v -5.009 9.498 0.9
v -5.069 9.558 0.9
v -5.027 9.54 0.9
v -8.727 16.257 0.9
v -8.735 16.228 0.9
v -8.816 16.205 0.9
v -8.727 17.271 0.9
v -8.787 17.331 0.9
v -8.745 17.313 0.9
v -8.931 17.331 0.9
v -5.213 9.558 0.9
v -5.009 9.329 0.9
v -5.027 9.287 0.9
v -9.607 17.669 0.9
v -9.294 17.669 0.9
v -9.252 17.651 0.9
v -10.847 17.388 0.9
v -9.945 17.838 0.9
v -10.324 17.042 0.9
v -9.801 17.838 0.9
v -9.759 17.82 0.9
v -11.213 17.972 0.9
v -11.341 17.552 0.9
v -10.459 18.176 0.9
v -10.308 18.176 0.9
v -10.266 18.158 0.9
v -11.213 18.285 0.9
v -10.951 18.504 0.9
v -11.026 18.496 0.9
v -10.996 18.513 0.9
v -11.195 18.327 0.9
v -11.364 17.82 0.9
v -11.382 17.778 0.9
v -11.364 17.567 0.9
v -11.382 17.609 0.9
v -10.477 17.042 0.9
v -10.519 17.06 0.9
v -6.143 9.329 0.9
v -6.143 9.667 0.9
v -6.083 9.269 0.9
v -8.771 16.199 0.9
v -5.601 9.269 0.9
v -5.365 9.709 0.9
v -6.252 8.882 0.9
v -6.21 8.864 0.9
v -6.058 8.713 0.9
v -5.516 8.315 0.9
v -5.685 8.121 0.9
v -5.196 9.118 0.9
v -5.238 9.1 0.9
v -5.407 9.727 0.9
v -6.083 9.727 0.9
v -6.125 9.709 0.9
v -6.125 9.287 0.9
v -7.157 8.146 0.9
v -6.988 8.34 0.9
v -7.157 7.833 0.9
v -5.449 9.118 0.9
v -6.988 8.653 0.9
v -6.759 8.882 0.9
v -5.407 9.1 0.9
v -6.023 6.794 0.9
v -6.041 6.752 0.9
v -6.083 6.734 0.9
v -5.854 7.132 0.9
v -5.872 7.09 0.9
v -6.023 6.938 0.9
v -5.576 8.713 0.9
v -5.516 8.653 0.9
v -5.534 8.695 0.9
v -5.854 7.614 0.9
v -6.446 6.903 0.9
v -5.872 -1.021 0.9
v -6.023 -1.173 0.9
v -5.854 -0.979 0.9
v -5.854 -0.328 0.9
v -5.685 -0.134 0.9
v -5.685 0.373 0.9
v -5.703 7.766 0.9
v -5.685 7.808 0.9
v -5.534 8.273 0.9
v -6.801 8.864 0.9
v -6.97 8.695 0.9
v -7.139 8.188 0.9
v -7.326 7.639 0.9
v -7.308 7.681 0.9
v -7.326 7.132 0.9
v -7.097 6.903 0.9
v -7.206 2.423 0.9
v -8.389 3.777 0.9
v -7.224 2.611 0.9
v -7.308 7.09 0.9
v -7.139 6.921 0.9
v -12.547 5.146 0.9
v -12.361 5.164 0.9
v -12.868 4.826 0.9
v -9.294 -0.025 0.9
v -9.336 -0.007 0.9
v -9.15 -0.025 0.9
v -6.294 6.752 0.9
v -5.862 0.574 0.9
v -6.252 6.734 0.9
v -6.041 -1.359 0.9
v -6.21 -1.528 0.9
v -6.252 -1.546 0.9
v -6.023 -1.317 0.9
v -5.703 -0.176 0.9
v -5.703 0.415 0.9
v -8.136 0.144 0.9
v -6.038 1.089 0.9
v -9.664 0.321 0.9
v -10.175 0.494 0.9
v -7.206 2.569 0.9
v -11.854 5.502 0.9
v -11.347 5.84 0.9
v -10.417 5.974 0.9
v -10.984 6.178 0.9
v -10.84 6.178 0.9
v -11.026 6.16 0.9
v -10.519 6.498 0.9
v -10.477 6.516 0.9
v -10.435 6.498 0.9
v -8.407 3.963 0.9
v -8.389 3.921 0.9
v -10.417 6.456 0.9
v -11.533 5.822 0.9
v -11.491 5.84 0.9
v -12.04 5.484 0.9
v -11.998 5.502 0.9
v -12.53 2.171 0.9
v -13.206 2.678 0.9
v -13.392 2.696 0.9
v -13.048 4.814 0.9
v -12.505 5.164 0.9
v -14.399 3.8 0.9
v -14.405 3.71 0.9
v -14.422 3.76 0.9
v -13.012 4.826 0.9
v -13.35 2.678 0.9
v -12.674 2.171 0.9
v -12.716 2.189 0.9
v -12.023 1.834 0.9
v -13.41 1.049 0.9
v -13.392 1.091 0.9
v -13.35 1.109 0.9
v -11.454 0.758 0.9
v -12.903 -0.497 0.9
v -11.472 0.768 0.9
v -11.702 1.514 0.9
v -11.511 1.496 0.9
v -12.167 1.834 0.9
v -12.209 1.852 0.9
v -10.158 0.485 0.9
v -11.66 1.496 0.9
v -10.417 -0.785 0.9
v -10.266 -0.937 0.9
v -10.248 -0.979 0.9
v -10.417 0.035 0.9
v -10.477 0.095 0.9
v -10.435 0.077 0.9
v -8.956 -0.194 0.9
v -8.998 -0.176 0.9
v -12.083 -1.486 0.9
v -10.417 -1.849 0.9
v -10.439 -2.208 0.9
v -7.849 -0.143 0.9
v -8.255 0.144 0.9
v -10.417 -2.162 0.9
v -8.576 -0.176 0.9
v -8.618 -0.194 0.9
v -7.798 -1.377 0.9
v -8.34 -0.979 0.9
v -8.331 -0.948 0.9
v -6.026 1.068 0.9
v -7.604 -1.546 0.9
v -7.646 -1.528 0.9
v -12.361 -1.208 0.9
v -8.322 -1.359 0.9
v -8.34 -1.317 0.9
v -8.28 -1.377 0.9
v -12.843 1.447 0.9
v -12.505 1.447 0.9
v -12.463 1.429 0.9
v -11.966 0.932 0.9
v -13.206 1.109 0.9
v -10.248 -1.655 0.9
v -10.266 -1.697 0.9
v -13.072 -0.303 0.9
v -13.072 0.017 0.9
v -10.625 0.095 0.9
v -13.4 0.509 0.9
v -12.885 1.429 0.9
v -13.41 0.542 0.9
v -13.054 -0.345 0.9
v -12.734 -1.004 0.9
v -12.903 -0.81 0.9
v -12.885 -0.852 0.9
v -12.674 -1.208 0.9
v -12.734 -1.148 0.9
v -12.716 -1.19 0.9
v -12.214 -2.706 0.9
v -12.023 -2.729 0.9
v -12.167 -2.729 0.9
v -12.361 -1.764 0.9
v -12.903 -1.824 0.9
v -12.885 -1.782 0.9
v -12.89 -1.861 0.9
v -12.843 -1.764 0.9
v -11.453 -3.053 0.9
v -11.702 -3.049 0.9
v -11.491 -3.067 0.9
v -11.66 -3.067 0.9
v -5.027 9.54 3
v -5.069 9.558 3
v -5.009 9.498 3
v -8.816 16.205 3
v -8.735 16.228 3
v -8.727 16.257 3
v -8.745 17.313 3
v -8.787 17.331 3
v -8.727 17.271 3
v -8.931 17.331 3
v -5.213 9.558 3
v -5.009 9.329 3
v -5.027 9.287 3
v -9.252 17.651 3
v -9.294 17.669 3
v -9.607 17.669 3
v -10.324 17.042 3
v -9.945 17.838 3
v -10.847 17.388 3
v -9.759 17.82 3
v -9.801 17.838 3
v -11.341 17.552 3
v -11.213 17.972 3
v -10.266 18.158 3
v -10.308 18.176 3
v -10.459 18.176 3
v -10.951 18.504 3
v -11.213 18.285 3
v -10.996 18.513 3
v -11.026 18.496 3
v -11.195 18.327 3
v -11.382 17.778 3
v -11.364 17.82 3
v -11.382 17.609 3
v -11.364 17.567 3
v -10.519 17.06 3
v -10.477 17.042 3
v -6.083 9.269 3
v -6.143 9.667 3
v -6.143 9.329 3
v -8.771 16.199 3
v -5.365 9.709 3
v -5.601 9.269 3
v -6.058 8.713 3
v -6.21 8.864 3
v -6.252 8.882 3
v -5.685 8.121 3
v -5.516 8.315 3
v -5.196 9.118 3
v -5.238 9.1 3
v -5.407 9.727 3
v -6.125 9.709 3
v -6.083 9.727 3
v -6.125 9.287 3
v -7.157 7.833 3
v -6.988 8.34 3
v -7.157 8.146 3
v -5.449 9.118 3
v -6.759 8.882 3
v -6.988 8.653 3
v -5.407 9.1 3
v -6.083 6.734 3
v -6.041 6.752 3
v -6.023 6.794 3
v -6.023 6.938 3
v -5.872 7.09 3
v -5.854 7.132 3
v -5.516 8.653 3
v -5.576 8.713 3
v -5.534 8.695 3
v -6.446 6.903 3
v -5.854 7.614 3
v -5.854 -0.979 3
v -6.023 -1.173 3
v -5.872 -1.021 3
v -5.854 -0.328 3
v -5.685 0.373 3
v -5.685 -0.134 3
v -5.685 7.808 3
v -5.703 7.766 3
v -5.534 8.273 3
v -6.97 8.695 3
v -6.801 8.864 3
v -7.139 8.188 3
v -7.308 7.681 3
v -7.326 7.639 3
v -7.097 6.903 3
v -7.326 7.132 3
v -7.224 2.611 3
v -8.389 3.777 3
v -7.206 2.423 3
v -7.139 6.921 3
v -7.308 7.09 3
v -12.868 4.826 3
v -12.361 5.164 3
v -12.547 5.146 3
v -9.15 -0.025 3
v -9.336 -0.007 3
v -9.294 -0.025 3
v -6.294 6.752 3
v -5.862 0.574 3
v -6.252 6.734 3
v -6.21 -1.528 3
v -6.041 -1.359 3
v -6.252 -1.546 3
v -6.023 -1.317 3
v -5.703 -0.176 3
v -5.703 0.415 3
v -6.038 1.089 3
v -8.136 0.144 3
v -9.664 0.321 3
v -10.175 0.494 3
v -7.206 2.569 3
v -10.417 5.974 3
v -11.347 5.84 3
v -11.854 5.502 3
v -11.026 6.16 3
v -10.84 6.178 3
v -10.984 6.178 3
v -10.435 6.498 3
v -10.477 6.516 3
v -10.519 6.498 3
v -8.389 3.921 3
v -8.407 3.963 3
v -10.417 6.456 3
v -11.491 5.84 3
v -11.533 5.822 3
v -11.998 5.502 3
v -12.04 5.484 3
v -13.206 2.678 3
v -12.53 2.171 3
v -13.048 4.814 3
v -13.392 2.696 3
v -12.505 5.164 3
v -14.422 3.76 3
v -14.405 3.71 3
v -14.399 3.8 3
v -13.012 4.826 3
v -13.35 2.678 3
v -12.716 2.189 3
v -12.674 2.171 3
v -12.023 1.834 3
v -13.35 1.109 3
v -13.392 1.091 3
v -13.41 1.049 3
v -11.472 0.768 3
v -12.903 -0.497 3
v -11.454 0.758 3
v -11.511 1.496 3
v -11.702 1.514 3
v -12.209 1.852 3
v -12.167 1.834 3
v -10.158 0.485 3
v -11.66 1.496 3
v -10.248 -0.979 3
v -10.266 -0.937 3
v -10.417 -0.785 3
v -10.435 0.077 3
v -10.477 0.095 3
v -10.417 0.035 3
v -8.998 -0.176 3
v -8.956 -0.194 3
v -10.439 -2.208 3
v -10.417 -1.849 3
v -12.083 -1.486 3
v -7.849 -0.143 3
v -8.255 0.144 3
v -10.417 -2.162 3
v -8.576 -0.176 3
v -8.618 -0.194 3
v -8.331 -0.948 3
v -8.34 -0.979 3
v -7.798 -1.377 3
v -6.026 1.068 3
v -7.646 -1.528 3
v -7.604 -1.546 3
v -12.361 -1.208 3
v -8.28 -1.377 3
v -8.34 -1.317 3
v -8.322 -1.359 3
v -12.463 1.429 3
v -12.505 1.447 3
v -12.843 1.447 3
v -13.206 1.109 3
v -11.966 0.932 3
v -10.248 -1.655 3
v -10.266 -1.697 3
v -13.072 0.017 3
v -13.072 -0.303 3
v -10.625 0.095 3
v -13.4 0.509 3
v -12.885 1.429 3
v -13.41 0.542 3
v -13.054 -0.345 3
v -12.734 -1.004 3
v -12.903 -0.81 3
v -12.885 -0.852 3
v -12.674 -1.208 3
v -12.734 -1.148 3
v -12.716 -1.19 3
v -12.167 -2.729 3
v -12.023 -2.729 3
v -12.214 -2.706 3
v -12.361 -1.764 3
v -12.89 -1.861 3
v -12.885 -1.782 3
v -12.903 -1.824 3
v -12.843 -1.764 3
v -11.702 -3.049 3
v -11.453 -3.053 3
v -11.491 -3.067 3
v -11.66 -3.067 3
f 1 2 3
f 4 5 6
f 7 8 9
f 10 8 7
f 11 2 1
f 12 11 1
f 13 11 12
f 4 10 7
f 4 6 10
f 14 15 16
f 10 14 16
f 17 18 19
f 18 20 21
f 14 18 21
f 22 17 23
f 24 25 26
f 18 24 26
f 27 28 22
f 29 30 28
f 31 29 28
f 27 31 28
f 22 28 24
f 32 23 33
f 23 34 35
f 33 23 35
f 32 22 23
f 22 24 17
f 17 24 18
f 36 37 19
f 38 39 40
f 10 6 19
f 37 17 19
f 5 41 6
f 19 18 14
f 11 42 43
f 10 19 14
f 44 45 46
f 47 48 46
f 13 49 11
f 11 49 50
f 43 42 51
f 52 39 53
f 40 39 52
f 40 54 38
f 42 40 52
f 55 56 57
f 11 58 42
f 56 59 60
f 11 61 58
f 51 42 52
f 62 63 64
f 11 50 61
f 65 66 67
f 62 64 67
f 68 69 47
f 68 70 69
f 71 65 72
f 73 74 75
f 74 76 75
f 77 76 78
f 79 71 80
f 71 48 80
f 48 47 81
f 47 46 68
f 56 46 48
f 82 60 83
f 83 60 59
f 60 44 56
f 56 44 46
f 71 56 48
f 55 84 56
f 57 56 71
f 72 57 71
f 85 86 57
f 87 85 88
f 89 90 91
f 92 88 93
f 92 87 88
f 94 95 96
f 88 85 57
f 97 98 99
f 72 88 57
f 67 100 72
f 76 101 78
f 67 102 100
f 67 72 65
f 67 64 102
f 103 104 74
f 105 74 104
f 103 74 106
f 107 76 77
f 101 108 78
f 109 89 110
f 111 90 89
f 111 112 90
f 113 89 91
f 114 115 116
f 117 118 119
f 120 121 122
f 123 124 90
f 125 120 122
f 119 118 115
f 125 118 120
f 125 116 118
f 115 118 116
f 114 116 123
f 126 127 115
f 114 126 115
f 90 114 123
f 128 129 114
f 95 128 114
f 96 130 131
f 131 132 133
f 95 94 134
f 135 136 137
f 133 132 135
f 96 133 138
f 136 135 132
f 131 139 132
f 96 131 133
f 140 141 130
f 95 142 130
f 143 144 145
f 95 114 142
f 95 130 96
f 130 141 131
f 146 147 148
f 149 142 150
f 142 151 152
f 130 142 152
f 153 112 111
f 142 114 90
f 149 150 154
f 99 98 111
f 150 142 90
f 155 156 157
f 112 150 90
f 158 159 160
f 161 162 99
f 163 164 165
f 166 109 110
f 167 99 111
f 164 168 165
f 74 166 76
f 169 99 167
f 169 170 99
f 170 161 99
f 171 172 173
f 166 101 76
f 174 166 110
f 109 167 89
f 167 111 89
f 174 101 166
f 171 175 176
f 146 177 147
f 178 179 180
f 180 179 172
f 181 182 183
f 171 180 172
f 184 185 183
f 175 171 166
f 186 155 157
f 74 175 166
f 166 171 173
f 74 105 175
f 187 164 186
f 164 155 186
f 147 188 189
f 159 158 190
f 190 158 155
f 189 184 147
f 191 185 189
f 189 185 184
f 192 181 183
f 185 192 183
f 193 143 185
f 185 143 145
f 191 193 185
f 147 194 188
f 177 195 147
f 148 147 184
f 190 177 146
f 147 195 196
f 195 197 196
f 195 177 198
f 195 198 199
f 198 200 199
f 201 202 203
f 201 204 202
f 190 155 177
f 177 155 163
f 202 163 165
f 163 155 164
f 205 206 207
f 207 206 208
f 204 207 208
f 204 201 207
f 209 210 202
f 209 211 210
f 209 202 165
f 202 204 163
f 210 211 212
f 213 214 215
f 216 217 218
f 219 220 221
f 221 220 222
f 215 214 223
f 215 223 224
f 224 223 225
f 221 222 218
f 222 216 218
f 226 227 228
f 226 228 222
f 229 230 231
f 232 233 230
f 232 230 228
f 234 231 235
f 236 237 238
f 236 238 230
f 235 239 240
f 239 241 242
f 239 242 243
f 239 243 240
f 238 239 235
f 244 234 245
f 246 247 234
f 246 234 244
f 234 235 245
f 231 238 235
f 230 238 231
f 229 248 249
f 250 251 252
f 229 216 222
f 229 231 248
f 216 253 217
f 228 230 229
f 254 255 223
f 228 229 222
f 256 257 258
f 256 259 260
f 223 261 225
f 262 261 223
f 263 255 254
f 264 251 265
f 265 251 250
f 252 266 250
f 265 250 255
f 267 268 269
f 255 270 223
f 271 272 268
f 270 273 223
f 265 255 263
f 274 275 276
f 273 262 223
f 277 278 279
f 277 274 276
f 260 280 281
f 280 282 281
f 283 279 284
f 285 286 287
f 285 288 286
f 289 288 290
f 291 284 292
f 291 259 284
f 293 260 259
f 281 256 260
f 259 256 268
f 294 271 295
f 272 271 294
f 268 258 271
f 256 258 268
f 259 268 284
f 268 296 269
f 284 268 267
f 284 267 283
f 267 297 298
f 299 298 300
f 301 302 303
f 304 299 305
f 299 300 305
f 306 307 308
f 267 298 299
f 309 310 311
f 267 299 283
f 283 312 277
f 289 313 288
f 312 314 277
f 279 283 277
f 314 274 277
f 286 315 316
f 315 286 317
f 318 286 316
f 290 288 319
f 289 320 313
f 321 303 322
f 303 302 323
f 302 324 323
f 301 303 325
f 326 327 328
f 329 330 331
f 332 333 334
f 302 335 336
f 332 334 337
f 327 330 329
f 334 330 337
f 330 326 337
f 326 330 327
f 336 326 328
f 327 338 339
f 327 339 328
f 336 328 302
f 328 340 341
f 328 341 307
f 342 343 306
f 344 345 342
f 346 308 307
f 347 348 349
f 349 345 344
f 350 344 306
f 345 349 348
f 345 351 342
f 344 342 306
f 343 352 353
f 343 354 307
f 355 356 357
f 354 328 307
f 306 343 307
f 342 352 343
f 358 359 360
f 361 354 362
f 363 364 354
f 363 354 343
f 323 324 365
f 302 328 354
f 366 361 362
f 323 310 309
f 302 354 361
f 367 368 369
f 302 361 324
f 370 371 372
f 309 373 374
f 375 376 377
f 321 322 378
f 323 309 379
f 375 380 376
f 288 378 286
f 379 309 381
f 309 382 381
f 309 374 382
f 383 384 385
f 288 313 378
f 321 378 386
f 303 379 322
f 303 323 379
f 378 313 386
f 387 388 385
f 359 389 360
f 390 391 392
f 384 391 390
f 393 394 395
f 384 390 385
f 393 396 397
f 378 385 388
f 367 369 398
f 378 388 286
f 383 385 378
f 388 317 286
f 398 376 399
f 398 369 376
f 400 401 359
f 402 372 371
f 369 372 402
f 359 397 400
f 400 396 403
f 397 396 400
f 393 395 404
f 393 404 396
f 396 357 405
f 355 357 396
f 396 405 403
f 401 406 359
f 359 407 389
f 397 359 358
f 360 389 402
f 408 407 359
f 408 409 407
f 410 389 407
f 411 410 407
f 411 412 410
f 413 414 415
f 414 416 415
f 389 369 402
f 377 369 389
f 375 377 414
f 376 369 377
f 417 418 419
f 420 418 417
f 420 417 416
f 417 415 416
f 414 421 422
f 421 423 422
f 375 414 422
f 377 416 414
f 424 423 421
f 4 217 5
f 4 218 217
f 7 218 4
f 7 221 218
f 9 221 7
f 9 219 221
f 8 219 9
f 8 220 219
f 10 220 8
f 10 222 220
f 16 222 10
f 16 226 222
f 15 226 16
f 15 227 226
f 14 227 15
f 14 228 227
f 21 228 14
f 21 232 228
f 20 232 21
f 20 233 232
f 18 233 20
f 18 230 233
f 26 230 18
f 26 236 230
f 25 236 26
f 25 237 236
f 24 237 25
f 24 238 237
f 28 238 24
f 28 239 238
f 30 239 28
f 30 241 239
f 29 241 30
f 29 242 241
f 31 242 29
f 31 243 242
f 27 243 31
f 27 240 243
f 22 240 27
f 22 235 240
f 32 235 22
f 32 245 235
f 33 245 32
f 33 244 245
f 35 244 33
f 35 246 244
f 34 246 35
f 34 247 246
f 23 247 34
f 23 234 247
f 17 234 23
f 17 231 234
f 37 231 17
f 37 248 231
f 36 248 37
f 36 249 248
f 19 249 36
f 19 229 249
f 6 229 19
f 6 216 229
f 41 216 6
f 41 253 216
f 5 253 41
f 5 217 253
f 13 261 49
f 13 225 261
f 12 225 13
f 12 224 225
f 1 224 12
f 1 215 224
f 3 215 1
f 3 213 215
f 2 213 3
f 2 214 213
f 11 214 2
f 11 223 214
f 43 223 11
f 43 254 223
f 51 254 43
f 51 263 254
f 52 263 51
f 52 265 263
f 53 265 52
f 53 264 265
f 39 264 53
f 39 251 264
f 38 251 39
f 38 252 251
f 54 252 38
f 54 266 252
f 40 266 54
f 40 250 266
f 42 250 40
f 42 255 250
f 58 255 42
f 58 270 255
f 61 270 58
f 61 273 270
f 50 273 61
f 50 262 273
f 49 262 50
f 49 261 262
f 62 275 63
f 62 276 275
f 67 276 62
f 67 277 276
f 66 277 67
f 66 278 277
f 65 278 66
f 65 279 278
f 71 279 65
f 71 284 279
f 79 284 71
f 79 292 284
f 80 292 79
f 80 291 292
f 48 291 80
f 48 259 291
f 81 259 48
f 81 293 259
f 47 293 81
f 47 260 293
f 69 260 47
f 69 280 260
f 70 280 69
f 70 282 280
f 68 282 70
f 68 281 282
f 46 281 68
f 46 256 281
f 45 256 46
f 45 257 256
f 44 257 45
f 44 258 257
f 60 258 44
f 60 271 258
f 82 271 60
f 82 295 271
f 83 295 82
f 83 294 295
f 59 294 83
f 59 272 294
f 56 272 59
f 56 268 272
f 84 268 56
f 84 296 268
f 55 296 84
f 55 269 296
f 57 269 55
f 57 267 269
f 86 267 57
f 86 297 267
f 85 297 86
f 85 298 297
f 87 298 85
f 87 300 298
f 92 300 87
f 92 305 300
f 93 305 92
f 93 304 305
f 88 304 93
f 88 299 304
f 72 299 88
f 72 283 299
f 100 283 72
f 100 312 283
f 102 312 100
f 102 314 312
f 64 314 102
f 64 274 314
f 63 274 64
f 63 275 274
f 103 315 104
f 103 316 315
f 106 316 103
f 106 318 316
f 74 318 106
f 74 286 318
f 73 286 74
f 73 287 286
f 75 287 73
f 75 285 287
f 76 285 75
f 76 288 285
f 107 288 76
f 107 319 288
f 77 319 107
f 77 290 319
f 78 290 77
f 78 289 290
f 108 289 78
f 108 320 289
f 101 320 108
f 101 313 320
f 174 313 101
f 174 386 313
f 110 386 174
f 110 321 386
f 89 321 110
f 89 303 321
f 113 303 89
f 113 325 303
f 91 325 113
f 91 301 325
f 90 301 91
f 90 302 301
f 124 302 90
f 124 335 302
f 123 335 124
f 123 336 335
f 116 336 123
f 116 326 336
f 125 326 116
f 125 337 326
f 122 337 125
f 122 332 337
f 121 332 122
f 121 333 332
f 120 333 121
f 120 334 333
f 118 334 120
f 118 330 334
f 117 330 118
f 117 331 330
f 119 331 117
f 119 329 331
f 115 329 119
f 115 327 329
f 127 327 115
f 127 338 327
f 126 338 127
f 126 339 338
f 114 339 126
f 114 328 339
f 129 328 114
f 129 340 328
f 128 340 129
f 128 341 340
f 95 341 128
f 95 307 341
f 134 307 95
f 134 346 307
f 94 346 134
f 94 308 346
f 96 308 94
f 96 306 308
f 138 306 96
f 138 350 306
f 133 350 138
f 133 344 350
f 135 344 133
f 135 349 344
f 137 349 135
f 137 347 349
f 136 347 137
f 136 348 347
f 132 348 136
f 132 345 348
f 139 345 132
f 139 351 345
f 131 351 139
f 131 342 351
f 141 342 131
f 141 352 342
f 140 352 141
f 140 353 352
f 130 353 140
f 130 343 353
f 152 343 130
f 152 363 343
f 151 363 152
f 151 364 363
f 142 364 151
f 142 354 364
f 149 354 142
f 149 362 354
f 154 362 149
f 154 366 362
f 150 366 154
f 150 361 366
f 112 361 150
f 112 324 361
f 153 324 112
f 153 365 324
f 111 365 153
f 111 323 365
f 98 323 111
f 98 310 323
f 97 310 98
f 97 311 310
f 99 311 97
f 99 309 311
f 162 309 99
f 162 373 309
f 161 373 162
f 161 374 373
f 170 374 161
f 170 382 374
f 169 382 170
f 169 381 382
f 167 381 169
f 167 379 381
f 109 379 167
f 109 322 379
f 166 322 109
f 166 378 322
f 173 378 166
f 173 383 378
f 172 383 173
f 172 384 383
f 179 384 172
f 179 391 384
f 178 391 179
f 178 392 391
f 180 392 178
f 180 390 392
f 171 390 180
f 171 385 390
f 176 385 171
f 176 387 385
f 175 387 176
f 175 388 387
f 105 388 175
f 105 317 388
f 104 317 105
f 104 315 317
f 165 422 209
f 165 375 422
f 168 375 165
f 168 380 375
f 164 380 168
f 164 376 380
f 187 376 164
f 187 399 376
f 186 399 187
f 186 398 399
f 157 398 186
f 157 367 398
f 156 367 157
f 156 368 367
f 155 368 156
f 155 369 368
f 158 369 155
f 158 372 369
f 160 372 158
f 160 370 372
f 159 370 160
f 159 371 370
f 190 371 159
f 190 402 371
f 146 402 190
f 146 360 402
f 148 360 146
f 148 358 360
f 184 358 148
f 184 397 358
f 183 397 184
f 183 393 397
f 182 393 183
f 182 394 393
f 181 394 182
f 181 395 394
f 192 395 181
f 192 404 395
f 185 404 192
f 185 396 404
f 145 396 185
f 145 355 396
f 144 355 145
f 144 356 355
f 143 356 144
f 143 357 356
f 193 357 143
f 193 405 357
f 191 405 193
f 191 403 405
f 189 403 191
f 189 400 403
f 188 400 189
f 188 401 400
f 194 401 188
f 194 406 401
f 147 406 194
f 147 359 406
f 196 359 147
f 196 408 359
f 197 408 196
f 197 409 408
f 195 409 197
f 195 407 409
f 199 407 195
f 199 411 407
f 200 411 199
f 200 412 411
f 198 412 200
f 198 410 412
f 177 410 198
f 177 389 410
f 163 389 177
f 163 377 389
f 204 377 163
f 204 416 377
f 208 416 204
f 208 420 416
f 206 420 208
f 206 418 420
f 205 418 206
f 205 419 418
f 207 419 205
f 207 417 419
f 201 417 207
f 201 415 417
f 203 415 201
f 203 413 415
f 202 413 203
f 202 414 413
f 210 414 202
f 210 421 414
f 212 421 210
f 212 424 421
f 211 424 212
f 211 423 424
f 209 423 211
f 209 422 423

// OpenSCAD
$fn = 24;
translate([0, -2.500, 0.900])
  linear_extrude(height=2.100) {
offset(r=0.06, $fn=8) {
    polygon(points=[[-12.843,3.887],[-13.181,3.549],[-13.350,3.549],[-13.350,3.042],[-13.012,2.535],[-13.012,2.197],[-12.843,2.028],[-12.843,1.690],[-12.674,1.521],[-12.674,1.352],[-12.336,1.352],[-11.998,1.014],[-12.336,0.676],[-12.843,0.676],[-12.167,-0.169],[-11.998,-0.169],[-11.660,-0.507],[-11.491,-0.507],[-10.477,0.338],[-10.477,0.676],[-10.308,0.845],[-10.308,1.521],[-10.477,1.690],[-10.477,2.535],[-10.646,2.535],[-11.491,3.211],[-11.998,3.380],[-12.505,3.887]], paths=[[0,1,2,3,4,5,6,7,8,9,10,11,12,13,14,15,16,17,18,19,20,21,22,23,24,25,26,27]]);
    polygon(points=[[-14.363,6.252],[-13.350,5.238],[-13.181,5.238],[-12.674,4.731],[-12.505,4.731],[-12.167,4.394],[-11.998,4.394],[-11.660,4.056],[-11.491,4.056],[-10.139,3.042],[-9.632,2.873],[-9.294,2.535],[-9.125,2.535],[-8.956,2.366],[-8.618,2.366],[-8.280,2.704],[-8.111,2.704],[-7.773,2.366],[-8.280,1.521],[-8.280,1.183],[-7.773,1.183],[-7.604,1.014],[-6.252,1.014],[-6.083,1.183],[-6.083,1.352],[-5.914,1.521],[-5.914,2.197],[-5.745,2.366],[-5.745,2.873],[-5.914,3.042],[-6.083,3.549],[-7.266,4.900],[-7.266,5.069],[-8.449,6.252],[-8.449,6.421],[-10.477,8.449],[-10.477,8.956],[-10.815,8.618],[-10.984,8.618],[-11.322,8.280],[-11.491,8.280],[-11.829,7.942],[-11.998,7.942],[-12.336,7.604],[-12.505,7.604],[-12.843,7.266],[-13.012,7.266]], paths=[[0,1,2,3,4,5,6,7,8,9,10,11,12,13,14,15,16,17,18,19,20,21,22,23,24,25,26,27,28,29,30,31,32,33,34,35,36,37,38,39,40,41,42,43,44,45,46]]);
    polygon(points=[[-6.759,11.322],[-6.928,11.153],[-6.928,10.815],[-7.097,10.646],[-7.097,10.308],[-7.266,10.139],[-7.266,9.632],[-7.097,9.463],[-6.421,9.463],[-6.252,9.294],[-6.083,9.294],[-6.083,9.463],[-5.914,9.632],[-5.914,10.139],[-5.745,10.308],[-5.745,10.646],[-5.576,10.815],[-5.576,11.153],[-6.083,11.153],[-6.252,11.322]], paths=[[0,1,2,3,4,5,6,7,8,9,10,11,12,13,14,15,16,17,18,19]]);
    polygon(points=[[-6.083,12.167],[-6.083,11.829],[-5.576,11.829],[-5.407,11.660],[-5.238,11.660],[-5.069,11.829],[-5.069,11.998],[-5.238,11.998],[-5.407,12.167]], paths=[[0,1,2,3,4,5,6,7,8]]);
    polygon(points=[[-11.153,20.785],[-11.153,20.447],[-11.322,20.278],[-11.322,20.109],[-10.815,19.940],[-10.477,19.602],[-10.308,19.602],[-8.787,18.757],[-8.787,19.771],[-8.956,19.771],[-9.294,20.109],[-9.632,20.109],[-9.801,20.278],[-9.970,20.278],[-10.308,20.616],[-10.477,20.616],[-10.984,20.954]], paths=[[0,1,2,3,4,5,6,7,8,9,10,11,12,13,14,15,16]]);
}
}
